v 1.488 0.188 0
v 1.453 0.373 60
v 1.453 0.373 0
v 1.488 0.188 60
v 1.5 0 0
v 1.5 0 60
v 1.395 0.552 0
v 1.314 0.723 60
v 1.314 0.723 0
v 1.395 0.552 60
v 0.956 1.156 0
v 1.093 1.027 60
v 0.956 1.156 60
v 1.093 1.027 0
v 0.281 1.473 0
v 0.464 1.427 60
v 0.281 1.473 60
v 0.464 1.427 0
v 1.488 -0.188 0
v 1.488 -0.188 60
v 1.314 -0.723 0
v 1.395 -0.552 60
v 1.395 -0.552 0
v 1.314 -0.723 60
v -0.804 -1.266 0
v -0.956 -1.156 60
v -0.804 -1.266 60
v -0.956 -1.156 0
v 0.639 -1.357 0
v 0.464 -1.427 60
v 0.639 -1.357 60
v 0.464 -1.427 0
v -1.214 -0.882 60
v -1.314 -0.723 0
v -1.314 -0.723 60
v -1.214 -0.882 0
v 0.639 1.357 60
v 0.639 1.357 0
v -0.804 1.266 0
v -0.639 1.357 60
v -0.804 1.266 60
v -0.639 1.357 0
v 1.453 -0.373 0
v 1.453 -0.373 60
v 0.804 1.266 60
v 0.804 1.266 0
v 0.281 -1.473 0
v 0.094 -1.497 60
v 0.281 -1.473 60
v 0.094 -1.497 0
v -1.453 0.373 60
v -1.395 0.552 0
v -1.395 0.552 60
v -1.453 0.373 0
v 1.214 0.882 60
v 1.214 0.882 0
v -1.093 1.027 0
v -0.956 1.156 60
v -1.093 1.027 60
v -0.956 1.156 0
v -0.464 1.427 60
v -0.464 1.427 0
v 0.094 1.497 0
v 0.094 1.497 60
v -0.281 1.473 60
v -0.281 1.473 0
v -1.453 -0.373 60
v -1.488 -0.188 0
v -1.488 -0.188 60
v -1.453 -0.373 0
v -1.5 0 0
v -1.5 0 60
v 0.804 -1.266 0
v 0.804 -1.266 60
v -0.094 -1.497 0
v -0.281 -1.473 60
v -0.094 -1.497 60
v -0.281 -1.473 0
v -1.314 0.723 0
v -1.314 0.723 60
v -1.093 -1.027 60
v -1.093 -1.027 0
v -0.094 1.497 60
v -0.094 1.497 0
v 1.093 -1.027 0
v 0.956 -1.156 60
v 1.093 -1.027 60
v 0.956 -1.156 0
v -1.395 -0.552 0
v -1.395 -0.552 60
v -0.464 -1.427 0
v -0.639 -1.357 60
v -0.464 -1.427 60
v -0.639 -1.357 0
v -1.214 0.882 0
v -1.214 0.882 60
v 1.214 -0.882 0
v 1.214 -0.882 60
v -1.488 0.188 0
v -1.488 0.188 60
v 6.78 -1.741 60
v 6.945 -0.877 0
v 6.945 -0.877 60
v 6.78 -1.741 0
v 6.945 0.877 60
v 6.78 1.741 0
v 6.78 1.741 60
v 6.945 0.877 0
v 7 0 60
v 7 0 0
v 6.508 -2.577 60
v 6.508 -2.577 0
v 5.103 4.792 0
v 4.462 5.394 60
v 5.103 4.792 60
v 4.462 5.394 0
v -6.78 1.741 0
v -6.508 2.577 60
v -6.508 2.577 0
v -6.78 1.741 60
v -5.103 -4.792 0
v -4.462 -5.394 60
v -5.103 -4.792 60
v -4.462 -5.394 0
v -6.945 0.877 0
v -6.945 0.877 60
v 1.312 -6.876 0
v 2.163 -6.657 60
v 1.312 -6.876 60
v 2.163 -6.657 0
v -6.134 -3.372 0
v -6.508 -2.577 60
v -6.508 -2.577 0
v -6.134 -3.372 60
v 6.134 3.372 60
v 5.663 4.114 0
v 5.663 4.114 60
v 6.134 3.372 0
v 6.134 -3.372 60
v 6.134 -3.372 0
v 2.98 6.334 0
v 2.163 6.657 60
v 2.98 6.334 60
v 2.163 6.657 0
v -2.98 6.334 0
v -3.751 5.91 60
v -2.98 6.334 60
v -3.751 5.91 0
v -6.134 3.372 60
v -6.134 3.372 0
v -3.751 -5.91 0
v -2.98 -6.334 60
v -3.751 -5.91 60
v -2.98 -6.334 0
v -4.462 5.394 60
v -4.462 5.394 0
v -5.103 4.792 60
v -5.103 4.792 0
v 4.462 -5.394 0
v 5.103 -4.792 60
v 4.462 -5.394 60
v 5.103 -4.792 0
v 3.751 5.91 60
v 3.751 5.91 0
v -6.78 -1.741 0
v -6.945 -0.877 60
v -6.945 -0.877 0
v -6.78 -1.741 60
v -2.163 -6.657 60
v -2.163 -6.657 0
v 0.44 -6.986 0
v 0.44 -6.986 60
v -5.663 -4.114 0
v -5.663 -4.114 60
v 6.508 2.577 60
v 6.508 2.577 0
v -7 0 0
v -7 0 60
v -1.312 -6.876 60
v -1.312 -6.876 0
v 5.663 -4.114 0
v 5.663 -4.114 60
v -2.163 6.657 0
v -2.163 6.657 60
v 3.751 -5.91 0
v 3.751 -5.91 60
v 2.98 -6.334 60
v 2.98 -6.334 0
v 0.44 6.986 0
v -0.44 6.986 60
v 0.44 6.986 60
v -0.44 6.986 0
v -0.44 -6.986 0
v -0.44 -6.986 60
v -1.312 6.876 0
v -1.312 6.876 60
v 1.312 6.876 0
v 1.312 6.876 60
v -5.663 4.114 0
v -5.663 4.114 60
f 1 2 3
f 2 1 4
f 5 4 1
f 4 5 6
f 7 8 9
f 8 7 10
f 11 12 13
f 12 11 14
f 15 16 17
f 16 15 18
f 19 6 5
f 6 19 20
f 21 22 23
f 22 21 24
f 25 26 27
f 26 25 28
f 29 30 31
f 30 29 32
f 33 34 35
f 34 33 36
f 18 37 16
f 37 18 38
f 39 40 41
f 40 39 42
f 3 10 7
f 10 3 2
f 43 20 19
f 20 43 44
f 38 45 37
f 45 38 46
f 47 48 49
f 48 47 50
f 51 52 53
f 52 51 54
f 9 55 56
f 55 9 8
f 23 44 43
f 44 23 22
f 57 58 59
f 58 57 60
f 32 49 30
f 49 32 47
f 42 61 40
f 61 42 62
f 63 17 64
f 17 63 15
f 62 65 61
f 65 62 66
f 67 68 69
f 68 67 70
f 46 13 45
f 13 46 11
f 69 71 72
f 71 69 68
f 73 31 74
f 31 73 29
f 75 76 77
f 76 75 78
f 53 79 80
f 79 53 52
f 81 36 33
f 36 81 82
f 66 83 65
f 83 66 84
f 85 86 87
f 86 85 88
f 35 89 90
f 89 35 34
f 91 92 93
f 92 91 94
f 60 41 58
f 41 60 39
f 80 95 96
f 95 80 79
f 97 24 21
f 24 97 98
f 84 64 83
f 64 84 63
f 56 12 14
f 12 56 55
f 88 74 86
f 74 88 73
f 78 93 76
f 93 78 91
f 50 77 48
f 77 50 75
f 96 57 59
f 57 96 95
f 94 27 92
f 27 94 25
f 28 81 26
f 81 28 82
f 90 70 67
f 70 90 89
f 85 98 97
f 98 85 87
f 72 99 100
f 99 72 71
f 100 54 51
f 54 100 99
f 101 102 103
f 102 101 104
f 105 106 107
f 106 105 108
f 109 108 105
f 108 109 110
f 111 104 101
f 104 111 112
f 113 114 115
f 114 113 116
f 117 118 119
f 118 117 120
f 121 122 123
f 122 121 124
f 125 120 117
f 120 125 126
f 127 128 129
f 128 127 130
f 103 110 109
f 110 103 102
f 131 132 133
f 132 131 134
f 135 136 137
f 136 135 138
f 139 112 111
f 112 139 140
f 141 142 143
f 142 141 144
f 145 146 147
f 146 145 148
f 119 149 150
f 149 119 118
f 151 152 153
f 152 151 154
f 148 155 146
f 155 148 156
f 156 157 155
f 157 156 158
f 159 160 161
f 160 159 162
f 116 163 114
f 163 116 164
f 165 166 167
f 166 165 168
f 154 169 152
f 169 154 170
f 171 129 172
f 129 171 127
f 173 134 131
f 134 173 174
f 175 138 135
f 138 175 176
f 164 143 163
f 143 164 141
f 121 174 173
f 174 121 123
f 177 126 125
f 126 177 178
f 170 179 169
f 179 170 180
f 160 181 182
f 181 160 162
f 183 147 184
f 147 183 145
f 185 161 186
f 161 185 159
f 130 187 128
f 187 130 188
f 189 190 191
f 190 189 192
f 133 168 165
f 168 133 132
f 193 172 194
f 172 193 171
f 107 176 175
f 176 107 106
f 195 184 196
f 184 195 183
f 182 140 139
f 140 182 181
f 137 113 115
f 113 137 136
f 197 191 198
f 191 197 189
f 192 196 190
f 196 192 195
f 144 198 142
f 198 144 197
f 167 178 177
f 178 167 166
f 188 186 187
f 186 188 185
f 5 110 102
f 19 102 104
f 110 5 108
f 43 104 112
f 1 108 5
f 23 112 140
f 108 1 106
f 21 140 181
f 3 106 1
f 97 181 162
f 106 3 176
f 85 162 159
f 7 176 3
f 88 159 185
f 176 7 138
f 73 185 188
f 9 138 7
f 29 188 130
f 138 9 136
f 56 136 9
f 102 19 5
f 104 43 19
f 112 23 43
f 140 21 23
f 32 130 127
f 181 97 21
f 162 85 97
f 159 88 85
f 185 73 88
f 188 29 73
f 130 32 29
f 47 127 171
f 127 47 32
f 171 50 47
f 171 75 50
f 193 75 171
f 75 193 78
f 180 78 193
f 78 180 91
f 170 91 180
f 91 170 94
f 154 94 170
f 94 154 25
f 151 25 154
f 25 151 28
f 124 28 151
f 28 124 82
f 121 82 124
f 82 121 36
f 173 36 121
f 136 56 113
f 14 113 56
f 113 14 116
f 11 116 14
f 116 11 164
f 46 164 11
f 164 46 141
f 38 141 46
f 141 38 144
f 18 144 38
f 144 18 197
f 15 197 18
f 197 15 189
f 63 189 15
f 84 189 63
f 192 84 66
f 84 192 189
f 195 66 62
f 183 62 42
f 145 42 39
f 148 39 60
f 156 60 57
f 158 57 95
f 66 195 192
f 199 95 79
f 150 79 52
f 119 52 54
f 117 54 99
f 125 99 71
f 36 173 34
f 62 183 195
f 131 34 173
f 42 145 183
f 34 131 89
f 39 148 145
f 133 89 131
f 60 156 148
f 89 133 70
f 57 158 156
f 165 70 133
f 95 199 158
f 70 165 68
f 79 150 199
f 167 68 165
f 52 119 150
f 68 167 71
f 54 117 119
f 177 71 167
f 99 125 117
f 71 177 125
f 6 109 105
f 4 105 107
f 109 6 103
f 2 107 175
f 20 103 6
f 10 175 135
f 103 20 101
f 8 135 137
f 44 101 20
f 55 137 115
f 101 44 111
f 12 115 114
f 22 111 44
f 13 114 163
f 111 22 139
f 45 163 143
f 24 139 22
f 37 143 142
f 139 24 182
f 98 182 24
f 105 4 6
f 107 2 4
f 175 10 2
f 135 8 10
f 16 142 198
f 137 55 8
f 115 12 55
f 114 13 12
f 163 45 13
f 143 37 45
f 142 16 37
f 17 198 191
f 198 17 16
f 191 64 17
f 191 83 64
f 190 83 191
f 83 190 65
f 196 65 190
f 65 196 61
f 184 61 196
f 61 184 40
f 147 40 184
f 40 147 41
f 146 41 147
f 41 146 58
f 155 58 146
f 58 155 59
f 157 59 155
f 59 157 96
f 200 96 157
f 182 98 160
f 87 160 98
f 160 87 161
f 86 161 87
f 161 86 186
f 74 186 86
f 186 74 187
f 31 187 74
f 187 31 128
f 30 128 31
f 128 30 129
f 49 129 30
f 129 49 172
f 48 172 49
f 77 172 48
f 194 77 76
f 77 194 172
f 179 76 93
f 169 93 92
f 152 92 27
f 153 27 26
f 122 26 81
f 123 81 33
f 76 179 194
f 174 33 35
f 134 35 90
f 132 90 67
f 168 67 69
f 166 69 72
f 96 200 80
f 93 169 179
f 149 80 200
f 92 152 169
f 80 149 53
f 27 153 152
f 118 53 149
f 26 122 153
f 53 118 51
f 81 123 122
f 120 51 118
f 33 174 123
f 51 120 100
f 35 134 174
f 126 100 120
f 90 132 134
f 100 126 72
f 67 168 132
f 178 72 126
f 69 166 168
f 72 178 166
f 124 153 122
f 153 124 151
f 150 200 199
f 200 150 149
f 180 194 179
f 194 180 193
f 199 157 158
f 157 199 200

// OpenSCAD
$fn = 50;


difference() {
	union() {
		cylinder(h = 60, r = 7.0000000000);
	}
	union() {
		translate(v = [0, 0, -100]) {
			cylinder(h = 200, r = 1.5000000000);
		}
		translate(v = [0, 0, -100]) {
			cylinder(h = 200, r = 1.5000000000);
		}
	}
}
